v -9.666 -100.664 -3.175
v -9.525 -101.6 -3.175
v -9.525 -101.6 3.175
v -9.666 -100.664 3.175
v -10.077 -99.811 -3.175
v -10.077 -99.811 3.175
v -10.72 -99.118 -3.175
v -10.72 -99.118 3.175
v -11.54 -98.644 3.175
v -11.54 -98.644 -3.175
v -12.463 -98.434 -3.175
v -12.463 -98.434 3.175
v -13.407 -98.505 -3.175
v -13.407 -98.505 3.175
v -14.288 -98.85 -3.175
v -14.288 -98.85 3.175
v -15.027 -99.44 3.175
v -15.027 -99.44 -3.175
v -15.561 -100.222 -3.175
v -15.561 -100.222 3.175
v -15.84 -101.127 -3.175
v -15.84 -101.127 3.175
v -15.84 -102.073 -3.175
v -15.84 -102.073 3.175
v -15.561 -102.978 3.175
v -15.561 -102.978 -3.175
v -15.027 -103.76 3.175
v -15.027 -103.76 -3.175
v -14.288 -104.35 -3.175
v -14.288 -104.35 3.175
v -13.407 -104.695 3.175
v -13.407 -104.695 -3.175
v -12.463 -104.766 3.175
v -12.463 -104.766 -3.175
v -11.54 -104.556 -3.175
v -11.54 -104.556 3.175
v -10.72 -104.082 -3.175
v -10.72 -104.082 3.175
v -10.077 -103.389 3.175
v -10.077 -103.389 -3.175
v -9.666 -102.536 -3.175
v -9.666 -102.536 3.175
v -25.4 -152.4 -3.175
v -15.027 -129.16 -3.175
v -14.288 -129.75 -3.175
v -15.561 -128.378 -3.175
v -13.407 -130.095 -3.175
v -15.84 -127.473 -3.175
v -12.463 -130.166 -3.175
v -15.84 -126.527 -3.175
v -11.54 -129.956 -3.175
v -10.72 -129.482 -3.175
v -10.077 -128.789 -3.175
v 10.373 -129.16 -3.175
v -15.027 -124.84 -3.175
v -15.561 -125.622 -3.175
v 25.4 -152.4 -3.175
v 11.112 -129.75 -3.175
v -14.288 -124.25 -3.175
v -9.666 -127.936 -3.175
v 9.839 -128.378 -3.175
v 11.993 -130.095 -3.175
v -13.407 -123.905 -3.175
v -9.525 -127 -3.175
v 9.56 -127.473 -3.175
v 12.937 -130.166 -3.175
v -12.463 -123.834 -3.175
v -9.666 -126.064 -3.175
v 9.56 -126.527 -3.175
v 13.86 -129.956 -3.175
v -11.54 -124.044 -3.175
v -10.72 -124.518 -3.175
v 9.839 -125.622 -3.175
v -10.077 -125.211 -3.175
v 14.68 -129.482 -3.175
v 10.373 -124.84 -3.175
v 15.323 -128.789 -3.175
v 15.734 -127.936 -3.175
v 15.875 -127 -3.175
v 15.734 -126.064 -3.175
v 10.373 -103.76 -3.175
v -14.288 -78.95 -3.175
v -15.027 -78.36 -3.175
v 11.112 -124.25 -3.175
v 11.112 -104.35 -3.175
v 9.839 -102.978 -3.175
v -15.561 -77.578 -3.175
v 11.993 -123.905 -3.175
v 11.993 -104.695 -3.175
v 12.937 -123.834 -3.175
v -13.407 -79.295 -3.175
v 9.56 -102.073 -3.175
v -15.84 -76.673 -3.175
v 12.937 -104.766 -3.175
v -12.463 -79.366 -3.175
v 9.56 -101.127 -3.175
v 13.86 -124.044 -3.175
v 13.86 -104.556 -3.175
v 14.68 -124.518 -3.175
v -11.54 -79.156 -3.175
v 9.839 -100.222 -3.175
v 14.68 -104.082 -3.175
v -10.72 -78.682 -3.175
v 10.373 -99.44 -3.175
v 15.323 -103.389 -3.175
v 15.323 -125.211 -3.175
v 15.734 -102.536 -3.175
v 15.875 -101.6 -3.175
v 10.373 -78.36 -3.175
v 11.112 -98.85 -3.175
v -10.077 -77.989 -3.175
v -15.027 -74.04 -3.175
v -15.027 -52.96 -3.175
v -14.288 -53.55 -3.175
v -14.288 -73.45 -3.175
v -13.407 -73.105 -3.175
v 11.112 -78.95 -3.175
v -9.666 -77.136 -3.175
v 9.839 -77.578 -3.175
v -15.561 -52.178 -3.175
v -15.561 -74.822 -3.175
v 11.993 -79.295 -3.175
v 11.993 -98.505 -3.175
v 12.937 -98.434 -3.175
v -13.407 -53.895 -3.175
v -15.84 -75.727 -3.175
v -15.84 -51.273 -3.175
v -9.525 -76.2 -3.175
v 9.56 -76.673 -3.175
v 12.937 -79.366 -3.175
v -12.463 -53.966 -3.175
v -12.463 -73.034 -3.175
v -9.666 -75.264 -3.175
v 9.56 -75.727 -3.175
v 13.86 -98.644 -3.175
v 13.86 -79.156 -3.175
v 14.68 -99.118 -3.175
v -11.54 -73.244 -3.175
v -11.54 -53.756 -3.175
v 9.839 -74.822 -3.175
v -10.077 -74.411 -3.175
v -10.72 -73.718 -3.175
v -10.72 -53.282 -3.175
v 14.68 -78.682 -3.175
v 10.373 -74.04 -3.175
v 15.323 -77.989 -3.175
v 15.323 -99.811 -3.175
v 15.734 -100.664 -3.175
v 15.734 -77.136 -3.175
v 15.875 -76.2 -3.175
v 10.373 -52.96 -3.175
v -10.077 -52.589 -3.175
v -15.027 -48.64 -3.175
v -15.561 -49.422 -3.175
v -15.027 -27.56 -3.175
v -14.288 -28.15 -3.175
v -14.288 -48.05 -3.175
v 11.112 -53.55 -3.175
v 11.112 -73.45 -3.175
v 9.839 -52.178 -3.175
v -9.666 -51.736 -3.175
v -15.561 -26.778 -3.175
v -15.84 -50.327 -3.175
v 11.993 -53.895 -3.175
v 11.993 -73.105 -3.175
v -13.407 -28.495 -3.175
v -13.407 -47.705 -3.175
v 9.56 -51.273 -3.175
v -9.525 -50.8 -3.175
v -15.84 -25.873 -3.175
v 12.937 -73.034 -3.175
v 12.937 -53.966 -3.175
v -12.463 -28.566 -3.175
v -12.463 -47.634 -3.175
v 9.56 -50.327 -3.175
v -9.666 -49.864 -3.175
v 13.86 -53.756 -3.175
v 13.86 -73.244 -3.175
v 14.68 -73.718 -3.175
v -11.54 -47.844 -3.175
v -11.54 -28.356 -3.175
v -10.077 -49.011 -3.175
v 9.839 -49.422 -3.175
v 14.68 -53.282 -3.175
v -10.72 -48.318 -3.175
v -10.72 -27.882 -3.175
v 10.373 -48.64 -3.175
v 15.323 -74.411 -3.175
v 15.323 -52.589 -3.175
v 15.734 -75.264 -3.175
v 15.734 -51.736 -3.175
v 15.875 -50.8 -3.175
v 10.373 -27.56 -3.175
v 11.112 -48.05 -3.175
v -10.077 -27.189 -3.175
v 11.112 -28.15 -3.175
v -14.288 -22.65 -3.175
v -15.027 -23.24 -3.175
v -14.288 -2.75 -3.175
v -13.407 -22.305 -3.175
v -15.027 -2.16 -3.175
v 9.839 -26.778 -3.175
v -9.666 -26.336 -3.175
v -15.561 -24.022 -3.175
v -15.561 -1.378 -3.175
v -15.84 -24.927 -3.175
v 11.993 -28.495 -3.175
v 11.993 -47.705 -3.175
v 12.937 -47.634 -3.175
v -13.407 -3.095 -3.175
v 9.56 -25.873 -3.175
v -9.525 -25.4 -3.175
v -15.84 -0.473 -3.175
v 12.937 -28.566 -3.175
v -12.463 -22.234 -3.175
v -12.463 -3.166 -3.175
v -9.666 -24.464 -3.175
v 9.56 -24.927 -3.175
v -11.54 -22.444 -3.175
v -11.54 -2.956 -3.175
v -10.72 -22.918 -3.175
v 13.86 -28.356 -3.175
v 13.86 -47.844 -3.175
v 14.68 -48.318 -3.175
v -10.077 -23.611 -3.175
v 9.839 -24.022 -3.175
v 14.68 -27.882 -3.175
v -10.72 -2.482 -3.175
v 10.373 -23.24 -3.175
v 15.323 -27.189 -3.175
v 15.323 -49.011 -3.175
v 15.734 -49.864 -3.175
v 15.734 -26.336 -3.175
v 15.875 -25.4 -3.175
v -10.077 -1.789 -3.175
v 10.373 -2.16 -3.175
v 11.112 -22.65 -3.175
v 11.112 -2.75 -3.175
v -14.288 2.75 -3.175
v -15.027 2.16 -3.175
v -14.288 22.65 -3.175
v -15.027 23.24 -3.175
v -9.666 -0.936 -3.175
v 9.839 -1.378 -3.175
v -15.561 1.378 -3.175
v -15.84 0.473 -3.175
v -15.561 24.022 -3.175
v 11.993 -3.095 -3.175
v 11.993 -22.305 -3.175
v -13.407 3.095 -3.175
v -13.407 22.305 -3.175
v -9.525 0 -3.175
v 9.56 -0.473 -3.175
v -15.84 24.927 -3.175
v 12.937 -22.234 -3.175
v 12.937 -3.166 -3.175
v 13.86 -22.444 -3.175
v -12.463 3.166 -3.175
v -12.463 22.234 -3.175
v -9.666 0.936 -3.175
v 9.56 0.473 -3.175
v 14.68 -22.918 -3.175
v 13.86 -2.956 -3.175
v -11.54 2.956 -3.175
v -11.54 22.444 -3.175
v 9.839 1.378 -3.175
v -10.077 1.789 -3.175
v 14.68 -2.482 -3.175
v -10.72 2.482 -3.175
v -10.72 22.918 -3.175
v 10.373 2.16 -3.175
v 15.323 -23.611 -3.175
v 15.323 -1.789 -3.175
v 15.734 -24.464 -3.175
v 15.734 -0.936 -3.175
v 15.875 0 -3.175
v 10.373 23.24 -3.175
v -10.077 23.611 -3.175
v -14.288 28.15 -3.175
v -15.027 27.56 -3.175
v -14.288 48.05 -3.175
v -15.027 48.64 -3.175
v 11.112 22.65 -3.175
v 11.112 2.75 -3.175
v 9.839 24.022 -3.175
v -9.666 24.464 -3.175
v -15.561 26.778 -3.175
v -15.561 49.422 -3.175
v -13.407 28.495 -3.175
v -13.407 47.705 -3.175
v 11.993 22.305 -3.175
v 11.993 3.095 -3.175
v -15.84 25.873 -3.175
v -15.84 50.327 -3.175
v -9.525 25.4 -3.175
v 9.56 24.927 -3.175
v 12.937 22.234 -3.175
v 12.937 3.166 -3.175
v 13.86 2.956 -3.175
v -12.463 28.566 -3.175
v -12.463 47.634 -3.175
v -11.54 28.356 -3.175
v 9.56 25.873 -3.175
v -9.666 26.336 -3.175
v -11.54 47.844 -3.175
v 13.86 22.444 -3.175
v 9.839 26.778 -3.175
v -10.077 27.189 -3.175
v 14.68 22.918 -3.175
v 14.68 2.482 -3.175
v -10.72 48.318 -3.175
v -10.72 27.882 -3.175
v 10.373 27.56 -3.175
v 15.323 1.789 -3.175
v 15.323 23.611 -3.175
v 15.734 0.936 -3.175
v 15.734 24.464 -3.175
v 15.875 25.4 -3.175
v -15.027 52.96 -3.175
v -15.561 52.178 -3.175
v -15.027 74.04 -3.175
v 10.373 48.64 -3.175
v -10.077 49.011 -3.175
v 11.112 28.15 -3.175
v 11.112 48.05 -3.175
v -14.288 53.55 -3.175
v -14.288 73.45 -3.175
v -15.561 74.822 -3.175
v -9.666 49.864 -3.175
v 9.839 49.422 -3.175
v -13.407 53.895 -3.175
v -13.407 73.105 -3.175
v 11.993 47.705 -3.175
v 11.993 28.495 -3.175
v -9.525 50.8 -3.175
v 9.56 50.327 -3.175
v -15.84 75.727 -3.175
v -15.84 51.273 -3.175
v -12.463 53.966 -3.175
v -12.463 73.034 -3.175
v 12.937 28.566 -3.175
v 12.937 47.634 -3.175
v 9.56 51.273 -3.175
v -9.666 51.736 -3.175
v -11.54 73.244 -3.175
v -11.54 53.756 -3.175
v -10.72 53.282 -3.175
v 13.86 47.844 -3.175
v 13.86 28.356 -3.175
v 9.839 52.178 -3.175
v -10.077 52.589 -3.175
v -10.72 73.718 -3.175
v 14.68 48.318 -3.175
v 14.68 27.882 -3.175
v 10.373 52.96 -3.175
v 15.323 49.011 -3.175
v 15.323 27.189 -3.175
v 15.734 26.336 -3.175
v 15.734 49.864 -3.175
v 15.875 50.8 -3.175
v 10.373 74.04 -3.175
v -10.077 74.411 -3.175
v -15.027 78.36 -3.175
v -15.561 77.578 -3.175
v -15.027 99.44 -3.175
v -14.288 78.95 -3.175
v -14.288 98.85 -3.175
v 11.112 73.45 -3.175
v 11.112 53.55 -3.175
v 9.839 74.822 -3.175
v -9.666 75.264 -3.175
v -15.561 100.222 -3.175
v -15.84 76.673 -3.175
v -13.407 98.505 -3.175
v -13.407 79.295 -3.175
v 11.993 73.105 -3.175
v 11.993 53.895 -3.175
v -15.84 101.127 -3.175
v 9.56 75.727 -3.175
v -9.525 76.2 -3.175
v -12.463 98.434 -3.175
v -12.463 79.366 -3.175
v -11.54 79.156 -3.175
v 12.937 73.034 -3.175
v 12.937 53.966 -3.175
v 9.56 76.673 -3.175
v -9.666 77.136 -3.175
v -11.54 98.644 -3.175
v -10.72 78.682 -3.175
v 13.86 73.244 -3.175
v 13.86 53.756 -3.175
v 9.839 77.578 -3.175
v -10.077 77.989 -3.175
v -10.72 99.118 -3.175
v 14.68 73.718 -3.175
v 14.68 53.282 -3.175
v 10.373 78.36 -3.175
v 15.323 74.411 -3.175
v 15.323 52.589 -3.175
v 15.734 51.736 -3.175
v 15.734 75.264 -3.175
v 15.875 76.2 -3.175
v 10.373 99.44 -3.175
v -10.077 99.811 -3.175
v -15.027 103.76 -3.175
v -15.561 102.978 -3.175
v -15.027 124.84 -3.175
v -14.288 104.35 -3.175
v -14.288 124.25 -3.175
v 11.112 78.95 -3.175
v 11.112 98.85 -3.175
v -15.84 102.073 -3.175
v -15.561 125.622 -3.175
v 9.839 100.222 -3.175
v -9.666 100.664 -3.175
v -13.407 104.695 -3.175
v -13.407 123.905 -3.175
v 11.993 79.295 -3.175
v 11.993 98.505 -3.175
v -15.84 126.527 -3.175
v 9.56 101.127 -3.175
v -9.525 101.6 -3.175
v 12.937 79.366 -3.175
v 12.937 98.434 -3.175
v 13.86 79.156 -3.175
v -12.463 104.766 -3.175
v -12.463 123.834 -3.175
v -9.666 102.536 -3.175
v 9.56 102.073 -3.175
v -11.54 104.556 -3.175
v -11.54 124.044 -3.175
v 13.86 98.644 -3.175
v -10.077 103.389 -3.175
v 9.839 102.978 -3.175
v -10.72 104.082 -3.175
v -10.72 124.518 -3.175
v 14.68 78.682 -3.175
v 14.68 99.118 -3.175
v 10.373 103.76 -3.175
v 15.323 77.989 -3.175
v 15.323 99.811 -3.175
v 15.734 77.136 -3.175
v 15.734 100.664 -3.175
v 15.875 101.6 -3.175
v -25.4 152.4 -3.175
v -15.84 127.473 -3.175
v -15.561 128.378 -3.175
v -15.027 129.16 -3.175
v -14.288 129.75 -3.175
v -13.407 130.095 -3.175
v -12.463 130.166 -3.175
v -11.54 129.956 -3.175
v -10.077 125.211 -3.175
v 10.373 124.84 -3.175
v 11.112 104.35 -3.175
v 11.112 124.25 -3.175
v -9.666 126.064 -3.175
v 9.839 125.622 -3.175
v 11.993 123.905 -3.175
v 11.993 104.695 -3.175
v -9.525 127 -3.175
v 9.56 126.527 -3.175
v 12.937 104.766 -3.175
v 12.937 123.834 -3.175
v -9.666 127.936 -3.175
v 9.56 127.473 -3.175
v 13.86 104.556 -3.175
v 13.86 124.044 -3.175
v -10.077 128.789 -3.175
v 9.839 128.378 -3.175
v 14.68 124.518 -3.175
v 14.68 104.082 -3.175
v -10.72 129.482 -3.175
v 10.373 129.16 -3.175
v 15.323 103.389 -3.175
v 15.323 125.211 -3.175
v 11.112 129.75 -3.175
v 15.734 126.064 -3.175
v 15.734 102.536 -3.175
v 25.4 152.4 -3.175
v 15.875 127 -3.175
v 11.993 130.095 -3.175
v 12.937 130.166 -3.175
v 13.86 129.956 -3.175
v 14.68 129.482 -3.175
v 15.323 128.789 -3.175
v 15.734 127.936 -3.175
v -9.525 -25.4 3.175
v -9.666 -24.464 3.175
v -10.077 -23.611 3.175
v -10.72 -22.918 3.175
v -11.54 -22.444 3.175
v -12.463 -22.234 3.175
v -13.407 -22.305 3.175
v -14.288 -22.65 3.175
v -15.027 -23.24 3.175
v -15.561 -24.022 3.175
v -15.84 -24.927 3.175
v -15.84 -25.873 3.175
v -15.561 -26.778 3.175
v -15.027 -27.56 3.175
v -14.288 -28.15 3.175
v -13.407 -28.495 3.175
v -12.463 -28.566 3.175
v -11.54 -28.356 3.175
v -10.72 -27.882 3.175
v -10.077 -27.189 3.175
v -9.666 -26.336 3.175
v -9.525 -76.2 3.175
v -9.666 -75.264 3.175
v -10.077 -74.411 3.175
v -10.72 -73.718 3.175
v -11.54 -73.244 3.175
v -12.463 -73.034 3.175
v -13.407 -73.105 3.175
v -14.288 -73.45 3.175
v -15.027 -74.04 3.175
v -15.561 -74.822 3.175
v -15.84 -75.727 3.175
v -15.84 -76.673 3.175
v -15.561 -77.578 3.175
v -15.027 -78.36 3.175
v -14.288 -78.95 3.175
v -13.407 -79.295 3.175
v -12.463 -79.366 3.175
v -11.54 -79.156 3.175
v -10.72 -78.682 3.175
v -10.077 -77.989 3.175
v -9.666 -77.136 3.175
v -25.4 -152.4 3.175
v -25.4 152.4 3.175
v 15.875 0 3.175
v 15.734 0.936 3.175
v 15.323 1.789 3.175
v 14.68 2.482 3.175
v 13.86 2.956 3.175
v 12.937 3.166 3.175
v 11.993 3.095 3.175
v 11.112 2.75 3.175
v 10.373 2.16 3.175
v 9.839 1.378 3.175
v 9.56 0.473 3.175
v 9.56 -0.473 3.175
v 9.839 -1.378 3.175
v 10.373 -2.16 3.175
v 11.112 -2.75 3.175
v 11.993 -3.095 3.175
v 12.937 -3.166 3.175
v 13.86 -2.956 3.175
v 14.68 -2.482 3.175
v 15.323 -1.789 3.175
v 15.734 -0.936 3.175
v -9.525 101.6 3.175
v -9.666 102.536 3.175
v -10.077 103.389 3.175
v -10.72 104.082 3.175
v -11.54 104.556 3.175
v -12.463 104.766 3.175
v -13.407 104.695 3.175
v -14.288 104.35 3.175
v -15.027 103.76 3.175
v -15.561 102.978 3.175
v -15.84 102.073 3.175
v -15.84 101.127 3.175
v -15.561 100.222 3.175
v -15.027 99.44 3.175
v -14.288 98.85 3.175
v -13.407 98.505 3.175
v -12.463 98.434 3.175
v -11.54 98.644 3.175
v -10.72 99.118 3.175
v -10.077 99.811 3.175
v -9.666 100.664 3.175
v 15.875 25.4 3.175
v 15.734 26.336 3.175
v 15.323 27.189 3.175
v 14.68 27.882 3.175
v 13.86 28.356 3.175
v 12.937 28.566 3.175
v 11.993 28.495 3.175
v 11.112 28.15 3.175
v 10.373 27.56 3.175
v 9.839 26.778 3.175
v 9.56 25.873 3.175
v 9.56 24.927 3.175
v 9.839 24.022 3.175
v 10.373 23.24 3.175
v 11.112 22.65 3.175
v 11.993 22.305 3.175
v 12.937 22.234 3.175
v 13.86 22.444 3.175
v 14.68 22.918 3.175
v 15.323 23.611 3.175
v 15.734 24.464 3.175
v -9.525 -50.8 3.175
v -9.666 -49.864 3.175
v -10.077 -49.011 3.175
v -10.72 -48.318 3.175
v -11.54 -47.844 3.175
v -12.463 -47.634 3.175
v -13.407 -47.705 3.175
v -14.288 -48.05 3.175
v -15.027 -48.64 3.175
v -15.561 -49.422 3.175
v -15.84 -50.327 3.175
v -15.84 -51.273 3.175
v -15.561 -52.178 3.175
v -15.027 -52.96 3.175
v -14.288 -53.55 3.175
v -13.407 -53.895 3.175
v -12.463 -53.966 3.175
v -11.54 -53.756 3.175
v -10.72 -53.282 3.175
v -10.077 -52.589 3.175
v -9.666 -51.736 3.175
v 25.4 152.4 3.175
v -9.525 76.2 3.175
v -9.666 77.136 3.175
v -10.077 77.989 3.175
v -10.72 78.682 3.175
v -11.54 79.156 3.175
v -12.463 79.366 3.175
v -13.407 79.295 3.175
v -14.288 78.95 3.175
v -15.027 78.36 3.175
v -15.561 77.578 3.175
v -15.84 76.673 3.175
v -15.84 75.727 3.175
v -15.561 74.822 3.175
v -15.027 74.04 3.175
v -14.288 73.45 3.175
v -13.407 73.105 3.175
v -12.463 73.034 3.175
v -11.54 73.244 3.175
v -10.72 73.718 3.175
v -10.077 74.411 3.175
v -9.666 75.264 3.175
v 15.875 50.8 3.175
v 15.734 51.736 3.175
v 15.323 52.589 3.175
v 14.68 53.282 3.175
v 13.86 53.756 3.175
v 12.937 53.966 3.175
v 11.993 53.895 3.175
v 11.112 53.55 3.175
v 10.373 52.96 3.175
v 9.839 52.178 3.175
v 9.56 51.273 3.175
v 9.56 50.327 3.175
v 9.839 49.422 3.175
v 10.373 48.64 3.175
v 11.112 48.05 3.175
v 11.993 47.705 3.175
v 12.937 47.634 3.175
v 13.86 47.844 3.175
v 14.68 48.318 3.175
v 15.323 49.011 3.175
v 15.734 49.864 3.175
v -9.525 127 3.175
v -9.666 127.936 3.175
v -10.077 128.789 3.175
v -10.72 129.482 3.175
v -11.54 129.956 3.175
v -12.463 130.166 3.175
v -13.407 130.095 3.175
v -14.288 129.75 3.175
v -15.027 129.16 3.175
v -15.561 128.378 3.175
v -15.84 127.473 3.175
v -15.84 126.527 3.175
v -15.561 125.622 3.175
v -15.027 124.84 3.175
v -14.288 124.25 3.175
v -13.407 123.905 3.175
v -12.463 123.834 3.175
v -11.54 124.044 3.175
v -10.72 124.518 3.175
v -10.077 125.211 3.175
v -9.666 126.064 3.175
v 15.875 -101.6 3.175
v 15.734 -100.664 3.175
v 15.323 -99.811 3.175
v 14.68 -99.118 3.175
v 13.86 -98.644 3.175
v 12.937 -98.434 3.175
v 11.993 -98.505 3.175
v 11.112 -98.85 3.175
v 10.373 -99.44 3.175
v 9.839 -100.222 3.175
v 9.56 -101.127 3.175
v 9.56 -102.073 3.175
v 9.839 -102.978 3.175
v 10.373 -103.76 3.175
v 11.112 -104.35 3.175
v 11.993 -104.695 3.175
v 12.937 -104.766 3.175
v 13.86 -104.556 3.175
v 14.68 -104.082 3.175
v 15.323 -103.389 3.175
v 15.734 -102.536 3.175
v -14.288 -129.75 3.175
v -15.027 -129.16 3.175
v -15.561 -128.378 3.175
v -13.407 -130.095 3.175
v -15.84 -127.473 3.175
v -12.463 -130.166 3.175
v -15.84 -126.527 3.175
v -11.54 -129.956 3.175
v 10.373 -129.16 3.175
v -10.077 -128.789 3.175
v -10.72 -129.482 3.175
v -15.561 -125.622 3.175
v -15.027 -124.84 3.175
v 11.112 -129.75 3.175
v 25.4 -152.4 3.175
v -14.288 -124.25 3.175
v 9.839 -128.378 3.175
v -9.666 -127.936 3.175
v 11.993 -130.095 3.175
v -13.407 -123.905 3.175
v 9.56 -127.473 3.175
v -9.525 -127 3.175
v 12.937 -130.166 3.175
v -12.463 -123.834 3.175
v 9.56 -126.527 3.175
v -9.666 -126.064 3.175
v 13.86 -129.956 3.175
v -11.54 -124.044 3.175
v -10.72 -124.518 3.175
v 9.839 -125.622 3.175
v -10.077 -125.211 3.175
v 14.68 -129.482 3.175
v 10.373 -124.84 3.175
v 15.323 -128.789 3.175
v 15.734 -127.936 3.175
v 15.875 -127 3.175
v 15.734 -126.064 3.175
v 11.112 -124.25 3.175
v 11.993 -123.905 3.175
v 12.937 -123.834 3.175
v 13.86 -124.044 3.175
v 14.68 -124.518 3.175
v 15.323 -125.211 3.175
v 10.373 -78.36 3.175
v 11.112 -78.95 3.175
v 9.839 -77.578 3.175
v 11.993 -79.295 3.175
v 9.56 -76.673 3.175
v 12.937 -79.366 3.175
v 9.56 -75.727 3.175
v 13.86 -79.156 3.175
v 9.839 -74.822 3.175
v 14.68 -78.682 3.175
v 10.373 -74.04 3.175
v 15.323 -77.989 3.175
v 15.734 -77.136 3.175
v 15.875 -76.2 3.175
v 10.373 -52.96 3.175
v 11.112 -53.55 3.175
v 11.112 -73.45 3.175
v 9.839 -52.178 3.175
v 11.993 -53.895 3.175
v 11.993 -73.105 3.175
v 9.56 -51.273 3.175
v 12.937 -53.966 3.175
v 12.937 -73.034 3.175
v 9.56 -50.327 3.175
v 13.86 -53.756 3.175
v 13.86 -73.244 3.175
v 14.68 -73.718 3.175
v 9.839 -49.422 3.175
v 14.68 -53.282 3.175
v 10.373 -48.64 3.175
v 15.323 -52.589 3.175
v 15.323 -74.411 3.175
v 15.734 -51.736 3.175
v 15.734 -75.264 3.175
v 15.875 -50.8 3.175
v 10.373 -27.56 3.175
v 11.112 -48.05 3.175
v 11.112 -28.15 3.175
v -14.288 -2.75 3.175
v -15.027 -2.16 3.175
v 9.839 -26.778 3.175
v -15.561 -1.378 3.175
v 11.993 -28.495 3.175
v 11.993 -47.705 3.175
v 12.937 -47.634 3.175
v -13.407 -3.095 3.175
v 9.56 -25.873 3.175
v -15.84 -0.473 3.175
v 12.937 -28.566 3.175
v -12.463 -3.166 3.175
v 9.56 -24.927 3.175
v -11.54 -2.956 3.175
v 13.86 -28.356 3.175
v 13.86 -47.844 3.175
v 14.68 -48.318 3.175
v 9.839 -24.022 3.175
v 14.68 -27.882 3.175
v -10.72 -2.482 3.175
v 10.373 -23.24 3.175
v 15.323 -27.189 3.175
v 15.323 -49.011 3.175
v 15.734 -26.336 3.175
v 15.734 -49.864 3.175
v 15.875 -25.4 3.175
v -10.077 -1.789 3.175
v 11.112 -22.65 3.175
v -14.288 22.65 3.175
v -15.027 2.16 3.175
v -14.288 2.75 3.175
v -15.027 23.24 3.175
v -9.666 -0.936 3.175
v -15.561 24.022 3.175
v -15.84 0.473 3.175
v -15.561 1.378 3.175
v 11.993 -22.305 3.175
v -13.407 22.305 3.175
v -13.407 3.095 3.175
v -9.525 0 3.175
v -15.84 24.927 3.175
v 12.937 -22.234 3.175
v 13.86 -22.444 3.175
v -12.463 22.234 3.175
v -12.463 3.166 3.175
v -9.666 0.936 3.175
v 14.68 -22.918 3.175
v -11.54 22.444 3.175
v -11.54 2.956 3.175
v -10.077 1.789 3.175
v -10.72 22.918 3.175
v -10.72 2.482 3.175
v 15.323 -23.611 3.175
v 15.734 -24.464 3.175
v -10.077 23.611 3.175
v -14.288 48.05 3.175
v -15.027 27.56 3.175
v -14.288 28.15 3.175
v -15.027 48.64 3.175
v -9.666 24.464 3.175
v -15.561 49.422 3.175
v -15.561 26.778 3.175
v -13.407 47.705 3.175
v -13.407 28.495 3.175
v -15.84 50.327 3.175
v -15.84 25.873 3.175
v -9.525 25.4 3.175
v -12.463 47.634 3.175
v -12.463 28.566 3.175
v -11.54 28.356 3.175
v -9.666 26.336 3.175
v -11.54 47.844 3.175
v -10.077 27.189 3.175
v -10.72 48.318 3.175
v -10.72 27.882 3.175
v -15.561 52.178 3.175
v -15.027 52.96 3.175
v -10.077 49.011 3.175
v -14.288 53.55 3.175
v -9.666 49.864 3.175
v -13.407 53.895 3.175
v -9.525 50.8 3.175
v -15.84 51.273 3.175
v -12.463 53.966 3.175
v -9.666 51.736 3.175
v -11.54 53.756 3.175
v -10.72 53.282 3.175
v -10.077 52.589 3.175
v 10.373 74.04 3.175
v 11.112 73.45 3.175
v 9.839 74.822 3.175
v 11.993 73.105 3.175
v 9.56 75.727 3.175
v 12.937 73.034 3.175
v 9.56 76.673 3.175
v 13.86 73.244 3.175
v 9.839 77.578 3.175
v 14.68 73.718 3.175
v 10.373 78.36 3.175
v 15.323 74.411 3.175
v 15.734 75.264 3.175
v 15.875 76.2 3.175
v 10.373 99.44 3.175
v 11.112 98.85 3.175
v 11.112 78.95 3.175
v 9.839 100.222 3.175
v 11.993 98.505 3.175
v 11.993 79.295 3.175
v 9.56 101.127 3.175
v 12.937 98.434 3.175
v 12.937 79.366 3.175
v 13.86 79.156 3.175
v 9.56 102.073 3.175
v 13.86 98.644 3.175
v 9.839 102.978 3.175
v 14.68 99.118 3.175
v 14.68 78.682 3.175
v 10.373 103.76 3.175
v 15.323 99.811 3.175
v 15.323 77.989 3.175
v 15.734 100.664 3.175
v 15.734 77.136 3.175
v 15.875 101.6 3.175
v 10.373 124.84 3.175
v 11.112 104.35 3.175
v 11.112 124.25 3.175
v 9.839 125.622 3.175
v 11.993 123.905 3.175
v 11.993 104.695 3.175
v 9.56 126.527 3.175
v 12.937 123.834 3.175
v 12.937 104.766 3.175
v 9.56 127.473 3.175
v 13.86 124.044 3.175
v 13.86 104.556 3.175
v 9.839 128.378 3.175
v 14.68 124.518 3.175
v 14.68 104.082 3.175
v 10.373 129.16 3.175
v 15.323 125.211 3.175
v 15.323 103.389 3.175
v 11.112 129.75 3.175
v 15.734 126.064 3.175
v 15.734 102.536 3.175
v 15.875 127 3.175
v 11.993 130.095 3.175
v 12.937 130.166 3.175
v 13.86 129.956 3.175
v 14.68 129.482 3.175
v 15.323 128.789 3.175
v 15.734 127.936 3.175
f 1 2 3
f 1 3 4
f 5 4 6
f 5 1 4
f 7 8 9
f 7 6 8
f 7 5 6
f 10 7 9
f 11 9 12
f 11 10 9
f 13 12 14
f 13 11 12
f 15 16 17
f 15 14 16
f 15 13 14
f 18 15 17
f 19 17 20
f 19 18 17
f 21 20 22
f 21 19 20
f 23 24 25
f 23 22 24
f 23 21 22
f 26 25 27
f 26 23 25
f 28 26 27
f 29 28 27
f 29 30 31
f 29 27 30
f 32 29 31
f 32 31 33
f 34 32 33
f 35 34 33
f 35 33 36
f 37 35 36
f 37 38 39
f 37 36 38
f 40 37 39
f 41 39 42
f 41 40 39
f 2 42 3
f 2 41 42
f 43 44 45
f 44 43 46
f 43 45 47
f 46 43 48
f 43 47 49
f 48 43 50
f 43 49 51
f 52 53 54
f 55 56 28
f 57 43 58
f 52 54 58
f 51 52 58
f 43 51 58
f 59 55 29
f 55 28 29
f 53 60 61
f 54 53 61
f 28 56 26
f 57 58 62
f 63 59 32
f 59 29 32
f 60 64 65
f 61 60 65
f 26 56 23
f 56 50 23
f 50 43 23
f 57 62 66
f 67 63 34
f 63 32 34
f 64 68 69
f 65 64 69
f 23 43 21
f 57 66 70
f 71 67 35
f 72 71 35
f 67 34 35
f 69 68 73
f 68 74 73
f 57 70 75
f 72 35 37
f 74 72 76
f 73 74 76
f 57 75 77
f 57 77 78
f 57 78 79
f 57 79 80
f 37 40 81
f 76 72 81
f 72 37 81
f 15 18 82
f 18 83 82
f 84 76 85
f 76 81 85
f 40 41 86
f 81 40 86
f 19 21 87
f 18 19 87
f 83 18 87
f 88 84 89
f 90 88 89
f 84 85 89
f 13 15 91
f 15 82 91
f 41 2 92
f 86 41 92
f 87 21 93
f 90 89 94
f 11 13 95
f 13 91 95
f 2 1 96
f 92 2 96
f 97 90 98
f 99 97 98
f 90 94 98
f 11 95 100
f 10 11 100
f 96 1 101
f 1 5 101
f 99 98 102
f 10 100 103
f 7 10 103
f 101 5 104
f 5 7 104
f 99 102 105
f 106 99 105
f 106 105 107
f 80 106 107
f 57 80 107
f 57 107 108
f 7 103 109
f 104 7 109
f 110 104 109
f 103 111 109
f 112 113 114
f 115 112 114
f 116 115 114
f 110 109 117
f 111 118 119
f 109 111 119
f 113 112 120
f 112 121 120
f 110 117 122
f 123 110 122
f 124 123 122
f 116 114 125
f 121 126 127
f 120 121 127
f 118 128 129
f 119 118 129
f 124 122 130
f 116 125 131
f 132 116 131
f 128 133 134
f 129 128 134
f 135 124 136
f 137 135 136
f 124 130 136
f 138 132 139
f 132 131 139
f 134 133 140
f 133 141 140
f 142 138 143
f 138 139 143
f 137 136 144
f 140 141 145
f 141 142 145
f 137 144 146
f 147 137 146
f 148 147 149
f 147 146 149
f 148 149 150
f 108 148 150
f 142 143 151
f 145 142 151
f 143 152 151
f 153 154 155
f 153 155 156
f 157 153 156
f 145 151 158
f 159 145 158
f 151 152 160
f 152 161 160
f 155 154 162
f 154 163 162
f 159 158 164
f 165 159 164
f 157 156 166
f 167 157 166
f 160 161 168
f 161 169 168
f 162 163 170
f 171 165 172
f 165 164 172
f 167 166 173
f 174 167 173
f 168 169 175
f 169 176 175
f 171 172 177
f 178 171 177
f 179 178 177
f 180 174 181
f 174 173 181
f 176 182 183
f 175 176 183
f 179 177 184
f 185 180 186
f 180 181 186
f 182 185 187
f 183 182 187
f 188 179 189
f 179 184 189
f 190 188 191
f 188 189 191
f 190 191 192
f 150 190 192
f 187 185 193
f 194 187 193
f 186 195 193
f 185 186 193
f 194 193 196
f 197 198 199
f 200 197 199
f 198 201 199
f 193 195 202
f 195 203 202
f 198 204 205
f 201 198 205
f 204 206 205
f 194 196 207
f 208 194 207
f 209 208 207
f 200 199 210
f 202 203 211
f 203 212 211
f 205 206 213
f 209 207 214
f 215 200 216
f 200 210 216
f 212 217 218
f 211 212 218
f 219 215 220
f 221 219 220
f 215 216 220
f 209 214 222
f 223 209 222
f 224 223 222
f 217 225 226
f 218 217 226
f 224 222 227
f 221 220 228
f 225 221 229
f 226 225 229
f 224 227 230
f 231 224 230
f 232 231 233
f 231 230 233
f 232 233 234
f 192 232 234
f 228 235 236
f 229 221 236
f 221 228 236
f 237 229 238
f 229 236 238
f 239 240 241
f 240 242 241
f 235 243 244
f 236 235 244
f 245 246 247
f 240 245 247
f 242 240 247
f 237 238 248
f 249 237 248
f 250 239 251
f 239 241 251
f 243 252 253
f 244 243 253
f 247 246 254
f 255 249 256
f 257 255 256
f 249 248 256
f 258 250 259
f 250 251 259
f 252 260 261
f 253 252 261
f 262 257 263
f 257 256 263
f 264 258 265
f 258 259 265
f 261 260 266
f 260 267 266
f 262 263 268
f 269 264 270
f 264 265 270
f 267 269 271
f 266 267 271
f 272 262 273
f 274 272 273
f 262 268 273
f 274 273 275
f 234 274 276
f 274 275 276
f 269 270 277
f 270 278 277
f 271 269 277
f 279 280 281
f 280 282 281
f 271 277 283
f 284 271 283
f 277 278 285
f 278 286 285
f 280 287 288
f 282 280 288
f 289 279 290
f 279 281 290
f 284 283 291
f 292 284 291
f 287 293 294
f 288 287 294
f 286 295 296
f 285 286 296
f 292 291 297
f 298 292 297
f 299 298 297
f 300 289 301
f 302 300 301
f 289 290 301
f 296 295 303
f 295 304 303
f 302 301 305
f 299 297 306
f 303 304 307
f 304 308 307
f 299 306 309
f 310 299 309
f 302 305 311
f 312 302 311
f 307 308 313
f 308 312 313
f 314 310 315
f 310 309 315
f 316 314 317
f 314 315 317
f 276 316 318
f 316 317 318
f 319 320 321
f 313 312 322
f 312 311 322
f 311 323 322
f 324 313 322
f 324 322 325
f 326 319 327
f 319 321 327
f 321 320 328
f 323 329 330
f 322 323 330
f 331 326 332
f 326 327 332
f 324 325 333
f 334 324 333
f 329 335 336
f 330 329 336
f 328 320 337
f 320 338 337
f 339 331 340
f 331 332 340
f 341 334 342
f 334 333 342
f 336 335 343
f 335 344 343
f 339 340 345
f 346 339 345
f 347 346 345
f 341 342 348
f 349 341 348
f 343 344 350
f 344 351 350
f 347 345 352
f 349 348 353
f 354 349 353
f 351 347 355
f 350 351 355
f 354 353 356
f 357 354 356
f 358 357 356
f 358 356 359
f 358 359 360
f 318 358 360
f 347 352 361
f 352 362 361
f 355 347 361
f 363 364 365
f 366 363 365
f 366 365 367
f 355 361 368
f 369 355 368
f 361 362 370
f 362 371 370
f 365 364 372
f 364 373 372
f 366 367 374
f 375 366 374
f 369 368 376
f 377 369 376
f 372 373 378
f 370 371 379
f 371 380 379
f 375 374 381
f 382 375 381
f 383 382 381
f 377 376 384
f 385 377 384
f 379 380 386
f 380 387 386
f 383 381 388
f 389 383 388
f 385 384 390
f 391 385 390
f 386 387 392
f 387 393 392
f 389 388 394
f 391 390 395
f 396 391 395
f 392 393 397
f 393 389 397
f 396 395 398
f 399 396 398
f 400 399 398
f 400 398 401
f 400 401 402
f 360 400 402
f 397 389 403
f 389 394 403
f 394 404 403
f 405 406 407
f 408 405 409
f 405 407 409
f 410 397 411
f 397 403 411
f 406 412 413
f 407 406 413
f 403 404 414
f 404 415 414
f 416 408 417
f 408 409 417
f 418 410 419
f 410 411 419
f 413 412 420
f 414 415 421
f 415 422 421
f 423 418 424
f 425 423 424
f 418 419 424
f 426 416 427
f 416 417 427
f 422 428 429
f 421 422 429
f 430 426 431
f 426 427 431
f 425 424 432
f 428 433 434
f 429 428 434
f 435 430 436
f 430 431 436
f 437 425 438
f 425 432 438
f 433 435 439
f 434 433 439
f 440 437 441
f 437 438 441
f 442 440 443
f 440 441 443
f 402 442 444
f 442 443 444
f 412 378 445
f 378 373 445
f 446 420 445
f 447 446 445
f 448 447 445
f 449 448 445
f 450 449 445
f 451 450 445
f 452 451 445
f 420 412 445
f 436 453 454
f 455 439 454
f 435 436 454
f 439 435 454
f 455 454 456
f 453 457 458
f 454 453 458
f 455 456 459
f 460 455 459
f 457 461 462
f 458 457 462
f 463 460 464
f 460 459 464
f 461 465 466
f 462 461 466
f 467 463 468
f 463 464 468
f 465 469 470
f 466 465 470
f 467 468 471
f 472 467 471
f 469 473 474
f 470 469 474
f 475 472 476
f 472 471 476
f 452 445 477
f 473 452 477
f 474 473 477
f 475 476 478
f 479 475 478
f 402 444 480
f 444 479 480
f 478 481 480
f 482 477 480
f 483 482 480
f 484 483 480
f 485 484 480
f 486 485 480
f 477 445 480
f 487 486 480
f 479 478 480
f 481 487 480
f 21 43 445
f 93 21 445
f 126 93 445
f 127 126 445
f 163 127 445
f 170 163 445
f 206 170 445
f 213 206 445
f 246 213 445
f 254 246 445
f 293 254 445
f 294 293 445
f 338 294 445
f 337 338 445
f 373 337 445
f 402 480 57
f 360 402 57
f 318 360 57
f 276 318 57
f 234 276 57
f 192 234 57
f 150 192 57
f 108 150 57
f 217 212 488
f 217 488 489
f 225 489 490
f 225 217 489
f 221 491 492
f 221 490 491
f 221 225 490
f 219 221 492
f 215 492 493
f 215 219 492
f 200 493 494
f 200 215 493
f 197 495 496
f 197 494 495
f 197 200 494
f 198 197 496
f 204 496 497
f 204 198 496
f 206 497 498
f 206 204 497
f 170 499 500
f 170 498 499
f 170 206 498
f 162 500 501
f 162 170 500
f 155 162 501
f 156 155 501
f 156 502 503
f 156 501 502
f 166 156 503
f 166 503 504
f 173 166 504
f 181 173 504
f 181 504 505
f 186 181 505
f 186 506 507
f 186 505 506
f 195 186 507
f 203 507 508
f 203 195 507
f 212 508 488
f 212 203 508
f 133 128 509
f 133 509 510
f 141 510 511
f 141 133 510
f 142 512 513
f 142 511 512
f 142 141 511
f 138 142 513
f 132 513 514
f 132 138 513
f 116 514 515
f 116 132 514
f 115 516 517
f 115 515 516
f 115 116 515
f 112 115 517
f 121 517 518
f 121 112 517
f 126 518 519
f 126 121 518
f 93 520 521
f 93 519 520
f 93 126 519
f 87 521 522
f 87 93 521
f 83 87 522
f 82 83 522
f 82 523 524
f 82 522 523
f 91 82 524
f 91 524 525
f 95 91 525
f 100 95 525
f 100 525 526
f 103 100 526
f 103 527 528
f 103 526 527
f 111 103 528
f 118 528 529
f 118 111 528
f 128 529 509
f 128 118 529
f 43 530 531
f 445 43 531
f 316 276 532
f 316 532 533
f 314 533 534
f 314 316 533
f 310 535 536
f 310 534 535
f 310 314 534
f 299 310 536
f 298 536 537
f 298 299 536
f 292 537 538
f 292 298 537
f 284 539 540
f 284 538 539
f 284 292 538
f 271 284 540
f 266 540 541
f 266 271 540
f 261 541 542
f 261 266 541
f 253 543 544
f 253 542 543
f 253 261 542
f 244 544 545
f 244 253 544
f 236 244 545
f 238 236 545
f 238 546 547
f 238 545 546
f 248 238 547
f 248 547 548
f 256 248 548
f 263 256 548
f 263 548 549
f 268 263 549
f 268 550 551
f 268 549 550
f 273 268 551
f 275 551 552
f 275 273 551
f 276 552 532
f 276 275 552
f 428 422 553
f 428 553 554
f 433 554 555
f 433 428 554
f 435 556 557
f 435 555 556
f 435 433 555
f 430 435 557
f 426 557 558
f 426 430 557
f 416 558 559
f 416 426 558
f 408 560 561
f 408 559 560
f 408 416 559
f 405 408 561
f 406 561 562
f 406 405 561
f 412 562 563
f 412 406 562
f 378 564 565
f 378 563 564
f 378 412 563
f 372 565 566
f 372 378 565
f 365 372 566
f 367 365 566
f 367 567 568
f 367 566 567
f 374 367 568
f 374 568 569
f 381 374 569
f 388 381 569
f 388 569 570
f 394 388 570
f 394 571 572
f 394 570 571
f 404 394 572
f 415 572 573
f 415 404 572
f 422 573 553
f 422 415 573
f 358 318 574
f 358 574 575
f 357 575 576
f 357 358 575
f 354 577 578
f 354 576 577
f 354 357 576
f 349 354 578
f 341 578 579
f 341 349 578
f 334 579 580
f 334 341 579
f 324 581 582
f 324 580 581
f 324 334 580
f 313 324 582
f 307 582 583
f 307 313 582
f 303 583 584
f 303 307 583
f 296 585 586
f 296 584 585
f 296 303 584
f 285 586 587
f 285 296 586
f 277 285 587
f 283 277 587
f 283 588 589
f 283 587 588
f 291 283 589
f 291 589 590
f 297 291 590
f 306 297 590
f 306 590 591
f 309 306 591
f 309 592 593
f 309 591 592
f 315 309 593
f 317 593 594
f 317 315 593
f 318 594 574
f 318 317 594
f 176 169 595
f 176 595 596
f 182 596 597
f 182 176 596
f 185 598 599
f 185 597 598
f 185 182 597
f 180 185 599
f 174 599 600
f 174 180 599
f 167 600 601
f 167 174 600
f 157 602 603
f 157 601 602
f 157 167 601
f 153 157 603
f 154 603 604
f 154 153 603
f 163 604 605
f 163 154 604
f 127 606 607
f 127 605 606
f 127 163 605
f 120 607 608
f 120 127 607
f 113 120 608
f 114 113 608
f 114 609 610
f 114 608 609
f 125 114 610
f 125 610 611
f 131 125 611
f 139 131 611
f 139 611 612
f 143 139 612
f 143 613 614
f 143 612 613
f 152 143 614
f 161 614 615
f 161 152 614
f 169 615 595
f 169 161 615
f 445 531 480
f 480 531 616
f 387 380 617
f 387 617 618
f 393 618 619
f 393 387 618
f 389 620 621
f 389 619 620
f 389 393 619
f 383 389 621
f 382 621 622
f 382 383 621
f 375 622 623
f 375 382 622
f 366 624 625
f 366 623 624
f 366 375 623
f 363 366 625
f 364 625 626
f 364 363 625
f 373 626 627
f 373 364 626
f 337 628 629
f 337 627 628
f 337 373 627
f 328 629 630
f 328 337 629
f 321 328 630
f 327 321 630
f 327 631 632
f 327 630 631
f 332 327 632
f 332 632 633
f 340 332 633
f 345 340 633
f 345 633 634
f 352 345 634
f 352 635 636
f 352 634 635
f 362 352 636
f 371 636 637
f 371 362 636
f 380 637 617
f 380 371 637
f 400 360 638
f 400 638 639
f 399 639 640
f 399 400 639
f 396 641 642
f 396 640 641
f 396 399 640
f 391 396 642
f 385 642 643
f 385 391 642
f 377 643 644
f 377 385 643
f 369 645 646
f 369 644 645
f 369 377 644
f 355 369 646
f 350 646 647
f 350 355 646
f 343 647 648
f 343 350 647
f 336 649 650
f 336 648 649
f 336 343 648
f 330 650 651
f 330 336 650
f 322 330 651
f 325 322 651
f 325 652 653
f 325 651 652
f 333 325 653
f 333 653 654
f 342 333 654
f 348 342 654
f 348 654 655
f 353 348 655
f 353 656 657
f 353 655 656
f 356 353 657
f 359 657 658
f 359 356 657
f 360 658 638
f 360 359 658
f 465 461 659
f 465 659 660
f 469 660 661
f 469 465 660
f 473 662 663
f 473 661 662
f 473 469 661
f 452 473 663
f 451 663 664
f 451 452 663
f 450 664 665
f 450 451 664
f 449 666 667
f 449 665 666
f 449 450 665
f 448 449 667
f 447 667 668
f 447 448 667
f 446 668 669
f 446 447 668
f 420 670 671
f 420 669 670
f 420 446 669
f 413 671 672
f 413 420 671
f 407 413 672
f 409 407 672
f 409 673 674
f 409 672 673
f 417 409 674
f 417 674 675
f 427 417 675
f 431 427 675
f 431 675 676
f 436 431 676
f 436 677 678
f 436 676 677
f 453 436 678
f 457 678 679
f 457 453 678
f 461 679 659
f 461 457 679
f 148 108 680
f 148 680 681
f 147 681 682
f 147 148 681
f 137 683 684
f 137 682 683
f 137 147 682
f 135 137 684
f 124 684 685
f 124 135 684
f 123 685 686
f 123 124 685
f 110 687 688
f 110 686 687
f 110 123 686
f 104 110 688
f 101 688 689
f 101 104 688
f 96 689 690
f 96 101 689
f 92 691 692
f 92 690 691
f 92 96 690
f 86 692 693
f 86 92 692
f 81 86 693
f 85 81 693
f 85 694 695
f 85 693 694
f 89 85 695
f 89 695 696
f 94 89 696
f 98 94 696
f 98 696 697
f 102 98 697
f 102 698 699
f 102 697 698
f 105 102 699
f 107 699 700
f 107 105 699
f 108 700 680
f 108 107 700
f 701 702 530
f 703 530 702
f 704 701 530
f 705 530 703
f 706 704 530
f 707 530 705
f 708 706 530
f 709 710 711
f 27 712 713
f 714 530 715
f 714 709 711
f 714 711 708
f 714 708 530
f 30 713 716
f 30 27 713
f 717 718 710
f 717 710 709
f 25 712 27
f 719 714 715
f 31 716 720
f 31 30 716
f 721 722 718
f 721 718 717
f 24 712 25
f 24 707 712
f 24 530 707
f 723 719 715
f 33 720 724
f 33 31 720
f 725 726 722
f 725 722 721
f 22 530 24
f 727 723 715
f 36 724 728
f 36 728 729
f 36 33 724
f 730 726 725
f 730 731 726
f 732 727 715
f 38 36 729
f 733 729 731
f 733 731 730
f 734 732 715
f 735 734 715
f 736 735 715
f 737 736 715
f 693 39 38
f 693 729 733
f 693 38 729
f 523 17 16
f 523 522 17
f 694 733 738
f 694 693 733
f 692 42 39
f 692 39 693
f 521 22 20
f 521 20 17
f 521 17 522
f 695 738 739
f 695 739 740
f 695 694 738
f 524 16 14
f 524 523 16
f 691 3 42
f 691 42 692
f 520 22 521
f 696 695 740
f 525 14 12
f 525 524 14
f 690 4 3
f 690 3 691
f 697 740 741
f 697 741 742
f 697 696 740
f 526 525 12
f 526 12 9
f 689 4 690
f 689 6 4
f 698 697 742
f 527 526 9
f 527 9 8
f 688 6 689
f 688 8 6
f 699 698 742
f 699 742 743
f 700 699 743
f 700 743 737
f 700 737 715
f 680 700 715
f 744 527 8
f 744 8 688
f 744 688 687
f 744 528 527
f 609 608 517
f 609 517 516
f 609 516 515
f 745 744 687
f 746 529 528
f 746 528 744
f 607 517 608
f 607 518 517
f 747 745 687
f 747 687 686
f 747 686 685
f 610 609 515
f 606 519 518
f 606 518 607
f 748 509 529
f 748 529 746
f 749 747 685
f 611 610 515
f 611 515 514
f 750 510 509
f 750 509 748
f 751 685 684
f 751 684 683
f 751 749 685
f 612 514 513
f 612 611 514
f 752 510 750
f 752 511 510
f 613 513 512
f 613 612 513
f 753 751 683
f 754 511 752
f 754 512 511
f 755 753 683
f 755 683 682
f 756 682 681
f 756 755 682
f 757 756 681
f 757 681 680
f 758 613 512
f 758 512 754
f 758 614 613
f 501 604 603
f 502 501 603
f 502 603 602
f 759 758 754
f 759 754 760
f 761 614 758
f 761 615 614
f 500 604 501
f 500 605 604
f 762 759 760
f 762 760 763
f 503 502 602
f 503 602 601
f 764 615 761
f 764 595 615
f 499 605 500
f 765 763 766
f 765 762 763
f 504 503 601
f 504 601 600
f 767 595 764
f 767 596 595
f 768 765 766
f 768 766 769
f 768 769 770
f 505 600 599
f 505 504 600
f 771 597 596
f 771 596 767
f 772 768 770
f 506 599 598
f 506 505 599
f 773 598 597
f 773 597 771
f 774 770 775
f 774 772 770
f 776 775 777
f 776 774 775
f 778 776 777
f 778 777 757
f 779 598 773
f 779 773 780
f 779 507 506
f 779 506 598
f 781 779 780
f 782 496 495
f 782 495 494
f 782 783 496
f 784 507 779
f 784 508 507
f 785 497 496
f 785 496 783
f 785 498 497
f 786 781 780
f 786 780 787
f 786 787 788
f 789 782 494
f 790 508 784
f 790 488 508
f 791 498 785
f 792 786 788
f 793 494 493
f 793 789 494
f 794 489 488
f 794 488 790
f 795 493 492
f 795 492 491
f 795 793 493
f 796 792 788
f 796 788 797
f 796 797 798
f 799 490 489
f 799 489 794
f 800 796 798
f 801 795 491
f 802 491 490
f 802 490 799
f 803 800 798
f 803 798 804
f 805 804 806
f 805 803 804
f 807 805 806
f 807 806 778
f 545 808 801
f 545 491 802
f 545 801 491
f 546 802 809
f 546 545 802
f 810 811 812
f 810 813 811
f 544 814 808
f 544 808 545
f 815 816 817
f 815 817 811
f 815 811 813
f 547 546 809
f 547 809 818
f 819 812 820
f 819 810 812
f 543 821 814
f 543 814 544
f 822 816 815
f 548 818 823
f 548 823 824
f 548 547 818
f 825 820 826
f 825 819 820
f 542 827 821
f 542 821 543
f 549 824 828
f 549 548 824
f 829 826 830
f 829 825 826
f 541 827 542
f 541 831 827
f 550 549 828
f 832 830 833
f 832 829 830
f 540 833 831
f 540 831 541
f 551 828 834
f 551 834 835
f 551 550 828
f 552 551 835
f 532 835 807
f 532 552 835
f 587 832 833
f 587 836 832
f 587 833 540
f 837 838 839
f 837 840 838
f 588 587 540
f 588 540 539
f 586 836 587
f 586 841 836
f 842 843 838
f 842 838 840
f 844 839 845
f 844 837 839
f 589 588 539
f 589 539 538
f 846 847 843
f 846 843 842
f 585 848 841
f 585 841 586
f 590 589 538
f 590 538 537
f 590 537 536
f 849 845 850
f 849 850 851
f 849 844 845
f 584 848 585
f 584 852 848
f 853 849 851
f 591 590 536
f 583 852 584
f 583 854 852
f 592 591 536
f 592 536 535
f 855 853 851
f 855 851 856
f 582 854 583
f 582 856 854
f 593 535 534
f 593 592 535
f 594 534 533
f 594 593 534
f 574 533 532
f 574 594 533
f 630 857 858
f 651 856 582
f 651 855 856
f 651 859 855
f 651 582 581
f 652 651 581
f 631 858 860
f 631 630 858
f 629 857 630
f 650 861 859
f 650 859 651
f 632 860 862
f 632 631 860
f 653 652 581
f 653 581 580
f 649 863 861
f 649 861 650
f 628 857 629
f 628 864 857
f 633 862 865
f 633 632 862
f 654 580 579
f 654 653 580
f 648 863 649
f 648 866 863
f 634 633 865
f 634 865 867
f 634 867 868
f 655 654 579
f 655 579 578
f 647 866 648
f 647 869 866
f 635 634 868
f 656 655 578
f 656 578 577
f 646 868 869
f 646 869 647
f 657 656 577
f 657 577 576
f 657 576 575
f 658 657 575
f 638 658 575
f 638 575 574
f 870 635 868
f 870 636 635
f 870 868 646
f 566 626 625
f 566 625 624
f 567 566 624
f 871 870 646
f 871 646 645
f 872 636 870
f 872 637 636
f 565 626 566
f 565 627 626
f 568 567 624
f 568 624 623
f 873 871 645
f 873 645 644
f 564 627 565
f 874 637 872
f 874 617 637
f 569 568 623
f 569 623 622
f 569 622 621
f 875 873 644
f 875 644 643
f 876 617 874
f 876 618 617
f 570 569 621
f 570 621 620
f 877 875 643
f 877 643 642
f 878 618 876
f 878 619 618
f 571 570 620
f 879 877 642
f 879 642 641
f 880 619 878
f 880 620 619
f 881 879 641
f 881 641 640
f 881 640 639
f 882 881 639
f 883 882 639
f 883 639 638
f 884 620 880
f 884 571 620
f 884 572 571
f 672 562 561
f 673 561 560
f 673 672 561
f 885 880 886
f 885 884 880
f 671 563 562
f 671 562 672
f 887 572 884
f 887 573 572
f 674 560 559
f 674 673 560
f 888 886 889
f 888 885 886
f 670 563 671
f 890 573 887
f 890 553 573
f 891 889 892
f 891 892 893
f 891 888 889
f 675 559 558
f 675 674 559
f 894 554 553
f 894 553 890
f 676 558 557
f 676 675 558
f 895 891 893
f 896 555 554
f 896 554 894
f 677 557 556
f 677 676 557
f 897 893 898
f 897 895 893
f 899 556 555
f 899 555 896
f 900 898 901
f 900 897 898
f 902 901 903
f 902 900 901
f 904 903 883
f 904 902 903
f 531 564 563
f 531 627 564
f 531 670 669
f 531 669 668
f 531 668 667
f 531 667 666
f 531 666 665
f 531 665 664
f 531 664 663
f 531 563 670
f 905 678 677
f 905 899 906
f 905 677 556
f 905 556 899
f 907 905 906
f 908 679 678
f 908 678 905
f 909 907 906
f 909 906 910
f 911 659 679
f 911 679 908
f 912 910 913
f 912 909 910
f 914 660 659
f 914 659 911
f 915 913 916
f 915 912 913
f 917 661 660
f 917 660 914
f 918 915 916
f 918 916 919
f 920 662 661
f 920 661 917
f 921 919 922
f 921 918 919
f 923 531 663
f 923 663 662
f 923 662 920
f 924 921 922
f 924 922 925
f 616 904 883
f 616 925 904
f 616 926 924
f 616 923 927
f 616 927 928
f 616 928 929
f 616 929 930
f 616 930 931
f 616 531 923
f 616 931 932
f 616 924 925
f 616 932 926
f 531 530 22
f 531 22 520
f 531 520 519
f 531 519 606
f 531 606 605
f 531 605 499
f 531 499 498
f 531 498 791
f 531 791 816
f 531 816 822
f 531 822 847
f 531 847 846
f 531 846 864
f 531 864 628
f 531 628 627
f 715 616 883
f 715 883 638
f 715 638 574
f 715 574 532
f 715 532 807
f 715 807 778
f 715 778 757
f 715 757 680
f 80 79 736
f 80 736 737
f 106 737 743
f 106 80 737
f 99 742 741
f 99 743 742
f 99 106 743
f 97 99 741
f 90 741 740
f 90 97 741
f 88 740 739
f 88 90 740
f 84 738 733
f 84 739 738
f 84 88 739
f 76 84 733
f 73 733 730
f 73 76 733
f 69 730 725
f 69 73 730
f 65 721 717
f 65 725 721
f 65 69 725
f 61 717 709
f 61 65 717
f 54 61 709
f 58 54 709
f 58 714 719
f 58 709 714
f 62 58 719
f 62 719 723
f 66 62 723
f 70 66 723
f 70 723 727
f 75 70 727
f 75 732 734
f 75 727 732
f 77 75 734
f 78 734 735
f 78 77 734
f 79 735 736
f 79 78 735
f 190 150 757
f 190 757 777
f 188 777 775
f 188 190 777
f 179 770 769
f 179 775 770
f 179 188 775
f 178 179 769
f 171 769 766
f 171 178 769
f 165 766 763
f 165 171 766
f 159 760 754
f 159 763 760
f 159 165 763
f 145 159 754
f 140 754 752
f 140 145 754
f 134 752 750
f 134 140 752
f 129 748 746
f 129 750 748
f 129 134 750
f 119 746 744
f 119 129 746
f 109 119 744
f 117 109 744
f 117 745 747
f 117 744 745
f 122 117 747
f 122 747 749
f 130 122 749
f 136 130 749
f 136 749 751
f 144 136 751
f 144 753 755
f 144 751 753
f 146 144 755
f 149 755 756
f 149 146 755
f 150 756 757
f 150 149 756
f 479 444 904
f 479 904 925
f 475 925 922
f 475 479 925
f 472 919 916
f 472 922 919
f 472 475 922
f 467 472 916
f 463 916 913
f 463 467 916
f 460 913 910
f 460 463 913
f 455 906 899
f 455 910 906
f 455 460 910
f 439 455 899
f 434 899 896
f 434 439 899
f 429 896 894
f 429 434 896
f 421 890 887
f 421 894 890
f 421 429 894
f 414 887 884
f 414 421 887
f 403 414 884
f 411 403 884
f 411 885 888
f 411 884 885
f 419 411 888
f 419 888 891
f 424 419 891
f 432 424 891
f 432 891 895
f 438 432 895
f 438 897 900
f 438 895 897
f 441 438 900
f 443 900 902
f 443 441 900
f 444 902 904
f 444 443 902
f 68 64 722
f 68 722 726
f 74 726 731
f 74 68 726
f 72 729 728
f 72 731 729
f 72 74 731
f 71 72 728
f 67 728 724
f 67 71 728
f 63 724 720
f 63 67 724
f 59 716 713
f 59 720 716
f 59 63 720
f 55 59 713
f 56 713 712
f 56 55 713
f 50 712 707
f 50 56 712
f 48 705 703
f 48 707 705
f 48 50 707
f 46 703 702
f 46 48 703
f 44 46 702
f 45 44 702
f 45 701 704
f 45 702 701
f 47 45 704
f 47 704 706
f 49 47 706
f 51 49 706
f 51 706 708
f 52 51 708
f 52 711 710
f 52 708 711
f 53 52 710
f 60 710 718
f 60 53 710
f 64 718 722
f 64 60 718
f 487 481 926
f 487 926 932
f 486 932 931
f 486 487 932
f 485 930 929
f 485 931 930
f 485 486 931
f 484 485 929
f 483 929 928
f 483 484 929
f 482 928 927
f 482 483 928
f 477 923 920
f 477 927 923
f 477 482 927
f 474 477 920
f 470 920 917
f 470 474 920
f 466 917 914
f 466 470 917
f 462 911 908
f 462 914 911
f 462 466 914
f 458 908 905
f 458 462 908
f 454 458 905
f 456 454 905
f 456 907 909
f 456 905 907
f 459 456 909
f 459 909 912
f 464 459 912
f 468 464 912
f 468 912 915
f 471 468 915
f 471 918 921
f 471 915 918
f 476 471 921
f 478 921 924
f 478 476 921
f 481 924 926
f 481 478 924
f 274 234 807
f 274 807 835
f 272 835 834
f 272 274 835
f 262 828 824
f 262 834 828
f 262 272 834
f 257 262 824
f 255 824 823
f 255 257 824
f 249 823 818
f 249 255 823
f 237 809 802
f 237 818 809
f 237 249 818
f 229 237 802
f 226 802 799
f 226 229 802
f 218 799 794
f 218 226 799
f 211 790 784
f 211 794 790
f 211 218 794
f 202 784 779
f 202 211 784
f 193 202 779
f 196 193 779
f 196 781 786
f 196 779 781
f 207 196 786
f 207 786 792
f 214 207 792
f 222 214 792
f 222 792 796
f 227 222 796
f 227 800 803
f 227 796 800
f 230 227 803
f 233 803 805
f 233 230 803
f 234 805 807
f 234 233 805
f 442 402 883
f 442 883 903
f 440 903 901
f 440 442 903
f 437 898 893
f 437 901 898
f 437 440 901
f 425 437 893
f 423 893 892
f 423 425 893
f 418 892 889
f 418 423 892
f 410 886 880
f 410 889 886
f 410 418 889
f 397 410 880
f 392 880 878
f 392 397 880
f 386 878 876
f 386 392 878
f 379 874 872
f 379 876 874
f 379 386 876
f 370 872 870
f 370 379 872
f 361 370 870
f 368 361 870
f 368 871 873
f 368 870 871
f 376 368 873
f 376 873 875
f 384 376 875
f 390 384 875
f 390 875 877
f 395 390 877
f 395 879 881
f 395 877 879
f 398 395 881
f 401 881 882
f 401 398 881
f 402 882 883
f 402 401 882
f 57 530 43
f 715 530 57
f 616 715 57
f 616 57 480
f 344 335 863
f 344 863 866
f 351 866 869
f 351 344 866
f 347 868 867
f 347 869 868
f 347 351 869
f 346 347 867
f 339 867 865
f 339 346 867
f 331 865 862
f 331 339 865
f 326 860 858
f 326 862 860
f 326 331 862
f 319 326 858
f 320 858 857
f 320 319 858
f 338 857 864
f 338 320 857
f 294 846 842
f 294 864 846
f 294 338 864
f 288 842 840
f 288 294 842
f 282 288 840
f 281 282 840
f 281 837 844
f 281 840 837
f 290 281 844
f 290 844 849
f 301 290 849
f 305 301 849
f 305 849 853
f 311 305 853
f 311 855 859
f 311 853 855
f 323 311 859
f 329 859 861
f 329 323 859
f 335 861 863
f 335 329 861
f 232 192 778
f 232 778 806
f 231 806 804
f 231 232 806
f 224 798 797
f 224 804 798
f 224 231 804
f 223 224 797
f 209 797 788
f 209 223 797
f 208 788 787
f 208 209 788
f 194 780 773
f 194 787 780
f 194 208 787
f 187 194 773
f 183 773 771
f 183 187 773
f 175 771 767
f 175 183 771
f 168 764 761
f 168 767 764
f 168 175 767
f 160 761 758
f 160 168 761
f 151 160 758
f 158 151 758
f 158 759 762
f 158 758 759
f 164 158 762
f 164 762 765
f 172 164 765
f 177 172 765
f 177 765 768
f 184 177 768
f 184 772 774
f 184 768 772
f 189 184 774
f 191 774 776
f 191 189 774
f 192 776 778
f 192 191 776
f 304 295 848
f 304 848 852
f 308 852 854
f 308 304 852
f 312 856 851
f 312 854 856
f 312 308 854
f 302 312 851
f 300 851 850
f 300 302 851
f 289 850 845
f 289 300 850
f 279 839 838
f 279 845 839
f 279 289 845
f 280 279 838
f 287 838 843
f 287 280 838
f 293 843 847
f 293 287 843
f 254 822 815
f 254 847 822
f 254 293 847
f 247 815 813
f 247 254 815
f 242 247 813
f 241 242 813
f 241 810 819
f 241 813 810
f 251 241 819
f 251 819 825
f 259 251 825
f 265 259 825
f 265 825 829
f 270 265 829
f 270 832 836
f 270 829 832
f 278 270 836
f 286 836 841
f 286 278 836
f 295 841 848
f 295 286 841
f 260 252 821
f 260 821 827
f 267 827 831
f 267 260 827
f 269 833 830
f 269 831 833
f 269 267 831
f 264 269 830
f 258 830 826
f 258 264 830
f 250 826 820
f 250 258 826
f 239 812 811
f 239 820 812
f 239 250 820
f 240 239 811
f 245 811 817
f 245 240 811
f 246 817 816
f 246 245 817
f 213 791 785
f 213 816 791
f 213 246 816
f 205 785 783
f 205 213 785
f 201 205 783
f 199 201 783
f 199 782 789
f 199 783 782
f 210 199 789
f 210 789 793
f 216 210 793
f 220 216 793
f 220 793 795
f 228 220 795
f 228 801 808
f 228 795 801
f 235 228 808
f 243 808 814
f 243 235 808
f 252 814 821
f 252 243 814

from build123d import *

# Parameters (mm, degrees)
SKETCH1_W               = 50.8
SKETCH1_H               = 304.8
BOSS_EXTRUDE1_DEPTH     = 3.175
CUT_EXTRUDE1_DEPTH      = 155.53478775
CUT_EXTRUDE1_DEPTH_BACK = 155.53478775
SKETCH2_R               = 3.175


with BuildPart() as part:
    # Sketch1 → Boss-Extrude1 (new, symmetric)
    with BuildSketch(Plane.XY):
        Rectangle(SKETCH1_W, SKETCH1_H)
    extrude(amount=BOSS_EXTRUDE1_DEPTH, both=True)

    # Sketch2 → Cut-Extrude1 (cut, two sides: drawn at the far end of the back side and taken through both)
    with BuildSketch(Plane.XY.offset(-CUT_EXTRUDE1_DEPTH_BACK)):
        with Locations((-12.7, 127)):
            Circle(SKETCH2_R)
        with Locations((12.7, 127)):
            Circle(SKETCH2_R)
        with Locations((12.7, 101.6)):
            Circle(SKETCH2_R)
        with Locations((12.7, 76.2)):
            Circle(SKETCH2_R)
        with Locations((12.7, 50.8)):
            Circle(SKETCH2_R)
        with Locations((12.7, 25.4)):
            Circle(SKETCH2_R)
        with Locations((12.7, 0)):
            Circle(SKETCH2_R)
        with Locations((12.7, -25.4)):
            Circle(SKETCH2_R)
        with Locations((12.7, -50.8)):
            Circle(SKETCH2_R)
        with Locations((12.7, -76.2)):
            Circle(SKETCH2_R)
        with Locations((12.7, -101.6)):
            Circle(SKETCH2_R)
        with Locations((-12.7, 101.6)):
            Circle(SKETCH2_R)
        with Locations((-12.7, 76.2)):
            Circle(SKETCH2_R)
        with Locations((-12.7, 50.8)):
            Circle(SKETCH2_R)
        with Locations((-12.7, 25.4)):
            Circle(SKETCH2_R)
        with Locations((-12.7, 0)):
            Circle(SKETCH2_R)
        with Locations((-12.7, -25.4)):
            Circle(SKETCH2_R)
        with Locations((-12.7, -50.8)):
            Circle(SKETCH2_R)
        with Locations((-12.7, -76.2)):
            Circle(SKETCH2_R)
        with Locations((-12.7, -101.6)):
            Circle(SKETCH2_R)
        with Locations((-12.7, -127)):
            Circle(SKETCH2_R)
        with Locations((12.7, -127)):
            Circle(SKETCH2_R)
    extrude(amount=CUT_EXTRUDE1_DEPTH + CUT_EXTRUDE1_DEPTH_BACK, mode=Mode.SUBTRACT)


solid = part.part
